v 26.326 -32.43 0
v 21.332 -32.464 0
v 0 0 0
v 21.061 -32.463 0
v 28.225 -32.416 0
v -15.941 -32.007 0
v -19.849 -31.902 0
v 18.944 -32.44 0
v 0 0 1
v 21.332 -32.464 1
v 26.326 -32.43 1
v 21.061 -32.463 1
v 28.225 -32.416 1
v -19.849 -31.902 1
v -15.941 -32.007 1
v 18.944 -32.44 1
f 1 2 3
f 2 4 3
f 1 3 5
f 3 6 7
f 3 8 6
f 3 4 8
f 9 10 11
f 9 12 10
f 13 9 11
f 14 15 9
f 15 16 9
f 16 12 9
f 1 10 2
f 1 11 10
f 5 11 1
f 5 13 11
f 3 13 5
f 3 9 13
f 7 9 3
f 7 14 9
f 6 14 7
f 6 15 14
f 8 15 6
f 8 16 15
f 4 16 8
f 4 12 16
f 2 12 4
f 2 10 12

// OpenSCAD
// Generated by SolidPython 1.1.3 on 2024-05-19 23:35:49


linear_extrude(height = 1) {
	polygon(points = [[0, 0], [-19.8494445312, -31.9016843750], [-19.7820644531, -31.9034984375], [-19.7146843750, -31.9053125000], [-19.6473042969, -31.9071265625], [-19.5799242187, -31.9089406250], [-19.5125441406, -31.9107546875], [-19.4451640625, -31.9125687500], [-19.3777839844, -31.9143828125], [-19.3104039062, -31.9161968750], [-19.2430238281, -31.9180109375], [-19.1756437500, -31.9198250000], [-19.1082636719, -31.9216390625], [-19.0408835937, -31.9234531250], [-18.9735035156, -31.9252671875], [-18.9061234375, -31.9270812500], [-18.8387433594, -31.9288953125], [-18.7713632813, -31.9307093750], [-18.7039832031, -31.9325234375], [-18.6366031250, -31.9343375000], [-18.5692230469, -31.9361515625], [-18.5018429688, -31.9379656250], [-18.4344628906, -31.9397796875], [-18.3670828125, -31.9415937500], [-18.2997027344, -31.9434078125], [-18.2323226562, -31.9452218750], [-18.1649425781, -31.9470359375], [-18.0975625000, -31.9488500000], [-18.0301824219, -31.9506640625], [-17.9628023437, -31.9524781250], [-17.8954222656, -31.9542921875], [-17.8280421875, -31.9561062500], [-17.7606621094, -31.9579203125], [-17.6932820312, -31.9597343750], [-17.6259019531, -31.9615484375], [-17.5585218750, -31.9633625000], [-17.4911417969, -31.9651765625], [-17.4237617187, -31.9669906250], [-17.3563816406, -31.9688046875], [-17.2890015625, -31.9706187500], [-17.2216214844, -31.9724328125], [-17.1542414062, -31.9742468750], [-17.0868613281, -31.9760609375], [-17.0194812500, -31.9778750000], [-16.9521011719, -31.9796890625], [-16.8847210937, -31.9815031250], [-16.8173410156, -31.9833171875], [-16.7499609375, -31.9851312500], [-16.6825808594, -31.9869453125], [-16.6152007812, -31.9887593750], [-16.5478207031, -31.9905734375], [-16.4804406250, -31.9923875000], [-16.4130605469, -31.9942015625], [-16.3456804688, -31.9960156250], [-16.2783003906, -31.9978296875], [-16.2109203125, -31.9996437500], [-16.1435402344, -32.0014578125], [-16.0761601563, -32.0032718750], [-16.0087800781, -32.0050859375], [-15.9414000000, -32.0069000000], [-15.8732650391, -32.0077462891], [-15.8051300781, -32.0085925781], [-15.7369951172, -32.0094388672], [-15.6688601562, -32.0102851563], [-15.6007251953, -32.0111314453], [-15.5325902344, -32.0119777344], [-15.4644552734, -32.0128240234], [-15.3963203125, -32.0136703125], [-15.3281853516, -32.0145166016], [-15.2600503906, -32.0153628906], [-15.1919154297, -32.0162091797], [-15.1237804687, -32.0170554688], [-15.0556455078, -32.0179017578], [-14.9875105469, -32.0187480469], [-14.9193755859, -32.0195943359], [-14.8512406250, -32.0204406250], [-14.7831056641, -32.0212869141], [-14.7149707031, -32.0221332031], [-14.6468357422, -32.0229794922], [-14.5787007812, -32.0238257813], [-14.5105658203, -32.0246720703], [-14.4424308594, -32.0255183594], [-14.3742958984, -32.0263646484], [-14.3061609375, -32.0272109375], [-14.2380259766, -32.0280572266], [-14.1698910156, -32.0289035156], [-14.1017560547, -32.0297498047], [-14.0336210937, -32.0305960938], [-13.9654861328, -32.0314423828], [-13.8973511719, -32.0322886719], [-13.8292162109, -32.0331349609], [-13.7610812500, -32.0339812500], [-13.6929462891, -32.0348275391], [-13.6248113281, -32.0356738281], [-13.5566763672, -32.0365201172], [-13.4885414063, -32.0373664063], [-13.4204064453, -32.0382126953], [-13.3522714844, -32.0390589844], [-13.2841365234, -32.0399052734], [-13.2160015625, -32.0407515625], [-13.1478666016, -32.0415978516], [-13.0797316406, -32.0424441406], [-13.0115966797, -32.0432904297], [-12.9434617188, -32.0441367188], [-12.8753267578, -32.0449830078], [-12.8071917969, -32.0458292969], [-12.7390568359, -32.0466755859], [-12.6709218750, -32.0475218750], [-12.6027869141, -32.0483681641], [-12.5346519531, -32.0492144531], [-12.4665169922, -32.0500607422], [-12.3983820312, -32.0509070313], [-12.3302470703, -32.0517533203], [-12.2621121094, -32.0525996094], [-12.1939771484, -32.0534458984], [-12.1258421875, -32.0542921875], [-12.0577072266, -32.0551384766], [-11.9895722656, -32.0559847656], [-11.9214373047, -32.0568310547], [-11.8533023437, -32.0576773438], [-11.7851673828, -32.0585236328], [-11.7170324219, -32.0593699219], [-11.6488974609, -32.0602162109], [-11.5807625000, -32.0610625000], [-11.5126275391, -32.0619087891], [-11.4444925781, -32.0627550781], [-11.3763576172, -32.0636013672], [-11.3082226562, -32.0644476563], [-11.2400876953, -32.0652939453], [-11.1719527344, -32.0661402344], [-11.1038177734, -32.0669865234], [-11.0356828125, -32.0678328125], [-10.9675478516, -32.0686791016], [-10.8994128906, -32.0695253906], [-10.8312779297, -32.0703716797], [-10.7631429687, -32.0712179688], [-10.6950080078, -32.0720642578], [-10.6268730469, -32.0729105469], [-10.5587380859, -32.0737568359], [-10.4906031250, -32.0746031250], [-10.4224681641, -32.0754494141], [-10.3543332031, -32.0762957031], [-10.2861982422, -32.0771419922], [-10.2180632813, -32.0779882813], [-10.1499283203, -32.0788345703], [-10.0817933594, -32.0796808594], [-10.0136583984, -32.0805271484], [-9.9455234375, -32.0813734375], [-9.8773884766, -32.0822197266], [-9.8092535156, -32.0830660156], [-9.7411185547, -32.0839123047], [-9.6729835938, -32.0847585938], [-9.6048486328, -32.0856048828], [-9.5367136719, -32.0864511719], [-9.4685787109, -32.0872974609], [-9.4004437500, -32.0881437500], [-9.3323087891, -32.0889900391], [-9.2641738281, -32.0898363281], [-9.1960388672, -32.0906826172], [-9.1279039062, -32.0915289063], [-9.0597689453, -32.0923751953], [-8.9916339844, -32.0932214844], [-8.9234990234, -32.0940677734], [-8.8553640625, -32.0949140625], [-8.7872291016, -32.0957603516], [-8.7190941406, -32.0966066406], [-8.6509591797, -32.0974529297], [-8.5828242187, -32.0982992188], [-8.5146892578, -32.0991455078], [-8.4465542969, -32.0999917969], [-8.3784193359, -32.1008380859], [-8.3102843750, -32.1016843750], [-8.2421494141, -32.1025306641], [-8.1740144531, -32.1033769531], [-8.1058794922, -32.1042232422], [-8.0377445312, -32.1050695313], [-7.9696095703, -32.1059158203], [-7.9014746094, -32.1067621094], [-7.8333396484, -32.1076083984], [-7.7652046875, -32.1084546875], [-7.6970697266, -32.1093009766], [-7.6289347656, -32.1101472656], [-7.5607998047, -32.1109935547], [-7.4926648437, -32.1118398438], [-7.4245298828, -32.1126861328], [-7.3563949219, -32.1135324219], [-7.2882599609, -32.1143787109], [-7.2201250000, -32.1152250000], [-7.1519900391, -32.1160712891], [-7.0838550781, -32.1169175781], [-7.0157201172, -32.1177638672], [-6.9475851562, -32.1186101562], [-6.8794501953, -32.1194564453], [-6.8113152344, -32.1203027344], [-6.7431802734, -32.1211490234], [-6.6750453125, -32.1219953125], [-6.6069103516, -32.1228416016], [-6.5387753906, -32.1236878906], [-6.4706404297, -32.1245341797], [-6.4025054688, -32.1253804688], [-6.3343705078, -32.1262267578], [-6.2662355469, -32.1270730469], [-6.1981005859, -32.1279193359], [-6.1299656250, -32.1287656250], [-6.0618306641, -32.1296119141], [-5.9936957031, -32.1304582031], [-5.9255607422, -32.1313044922], [-5.8574257812, -32.1321507813], [-5.7892908203, -32.1329970703], [-5.7211558594, -32.1338433594], [-5.6530208984, -32.1346896484], [-5.5848859375, -32.1355359375], [-5.5167509766, -32.1363822266], [-5.4486160156, -32.1372285156], [-5.3804810547, -32.1380748047], [-5.3123460937, -32.1389210937], [-5.2442111328, -32.1397673828], [-5.1760761719, -32.1406136719], [-5.1079412109, -32.1414599609], [-5.0398062500, -32.1423062500], [-4.9716712891, -32.1431525391], [-4.9035363281, -32.1439988281], [-4.8354013672, -32.1448451172], [-4.7672664063, -32.1456914063], [-4.6991314453, -32.1465376953], [-4.6309964844, -32.1473839844], [-4.5628615234, -32.1482302734], [-4.4947265625, -32.1490765625], [-4.4265916016, -32.1499228516], [-4.3584566406, -32.1507691406], [-4.2903216797, -32.1516154297], [-4.2221867188, -32.1524617188], [-4.1540517578, -32.1533080078], [-4.0859167969, -32.1541542969], [-4.0177818359, -32.1550005859], [-3.9496468750, -32.1558468750], [-3.8815119141, -32.1566931641], [-3.8133769531, -32.1575394531], [-3.7452419922, -32.1583857422], [-3.6771070312, -32.1592320312], [-3.6089720703, -32.1600783203], [-3.5408371094, -32.1609246094], [-3.4727021484, -32.1617708984], [-3.4045671875, -32.1626171875], [-3.3364322266, -32.1634634766], [-3.2682972656, -32.1643097656], [-3.2001623047, -32.1651560547], [-3.1320273437, -32.1660023438], [-3.0638923828, -32.1668486328], [-2.9957574219, -32.1676949219], [-2.9276224609, -32.1685412109], [-2.8594875000, -32.1693875000], [-2.7913525391, -32.1702337891], [-2.7232175781, -32.1710800781], [-2.6550826172, -32.1719263672], [-2.5869476562, -32.1727726563], [-2.5188126953, -32.1736189453], [-2.4506777344, -32.1744652344], [-2.3825427734, -32.1753115234], [-2.3144078125, -32.1761578125], [-2.2462728516, -32.1770041016], [-2.1781378906, -32.1778503906], [-2.1100029297, -32.1786966797], [-2.0418679688, -32.1795429687], [-1.9737330078, -32.1803892578], [-1.9055980469, -32.1812355469], [-1.8374630859, -32.1820818359], [-1.7693281250, -32.1829281250], [-1.7011931641, -32.1837744141], [-1.6330582031, -32.1846207031], [-1.5649232422, -32.1854669922], [-1.4967882812, -32.1863132813], [-1.4286533203, -32.1871595703], [-1.3605183594, -32.1880058594], [-1.2923833984, -32.1888521484], [-1.2242484375, -32.1896984375], [-1.1561134766, -32.1905447266], [-1.0879785156, -32.1913910156], [-1.0198435547, -32.1922373047], [-0.9517085937, -32.1930835938], [-0.8835736328, -32.1939298828], [-0.8154386719, -32.1947761719], [-0.7473037109, -32.1956224609], [-0.6791687500, -32.1964687500], [-0.6110337891, -32.1973150391], [-0.5428988281, -32.1981613281], [-0.4747638672, -32.1990076172], [-0.4066289062, -32.1998539062], [-0.3384939453, -32.2007001953], [-0.2703589844, -32.2015464844], [-0.2022240234, -32.2023927734], [-0.1340890625, -32.2032390625], [-0.0659541016, -32.2040853516], [0.0021808594, -32.2049316406], [0.0703158203, -32.2057779297], [0.1384507813, -32.2066242188], [0.2065857422, -32.2074705078], [0.2747207031, -32.2083167969], [0.3428556641, -32.2091630859], [0.4109906250, -32.2100093750], [0.4791255859, -32.2108556641], [0.5472605469, -32.2117019531], [0.6153955078, -32.2125482422], [0.6835304688, -32.2133945313], [0.7516654297, -32.2142408203], [0.8198003906, -32.2150871094], [0.8879353516, -32.2159333984], [0.9560703125, -32.2167796875], [1.0242052734, -32.2176259766], [1.0923402344, -32.2184722656], [1.1604751953, -32.2193185547], [1.2286101563, -32.2201648437], [1.2967451172, -32.2210111328], [1.3648800781, -32.2218574219], [1.4330150391, -32.2227037109], [1.5011500000, -32.2235500000], [1.5692849609, -32.2243962891], [1.6374199219, -32.2252425781], [1.7055548828, -32.2260888672], [1.7736898437, -32.2269351563], [1.8418248047, -32.2277814453], [1.9099597656, -32.2286277344], [1.9780947266, -32.2294740234], [2.0462296875, -32.2303203125], [2.1143646484, -32.2311666016], [2.1824996094, -32.2320128906], [2.2506345703, -32.2328591797], [2.3187695313, -32.2337054688], [2.3869044922, -32.2345517578], [2.4550394531, -32.2353980469], [2.5231744141, -32.2362443359], [2.5913093750, -32.2370906250], [2.6594443359, -32.2379369141], [2.7275792969, -32.2387832031], [2.7957142578, -32.2396294922], [2.8638492187, -32.2404757812], [2.9319841797, -32.2413220703], [3.0001191406, -32.2421683594], [3.0682541016, -32.2430146484], [3.1363890625, -32.2438609375], [3.2045240234, -32.2447072266], [3.2726589844, -32.2455535156], [3.3407939453, -32.2463998047], [3.4089289062, -32.2472460938], [3.4770638672, -32.2480923828], [3.5451988281, -32.2489386719], [3.6133337891, -32.2497849609], [3.6814687500, -32.2506312500], [3.7496037109, -32.2514775391], [3.8177386719, -32.2523238281], [3.8858736328, -32.2531701172], [3.9540085938, -32.2540164063], [4.0221435547, -32.2548626953], [4.0902785156, -32.2557089844], [4.1584134766, -32.2565552734], [4.2265484375, -32.2574015625], [4.2946833984, -32.2582478516], [4.3628183594, -32.2590941406], [4.4309533203, -32.2599404297], [4.4990882812, -32.2607867187], [4.5672232422, -32.2616330078], [4.6353582031, -32.2624792969], [4.7034931641, -32.2633255859], [4.7716281250, -32.2641718750], [4.8397630859, -32.2650181641], [4.9078980469, -32.2658644531], [4.9760330078, -32.2667107422], [5.0441679688, -32.2675570312], [5.1123029297, -32.2684033203], [5.1804378906, -32.2692496094], [5.2485728516, -32.2700958984], [5.3167078125, -32.2709421875], [5.3848427734, -32.2717884766], [5.4529777344, -32.2726347656], [5.5211126953, -32.2734810547], [5.5892476563, -32.2743273438], [5.6573826172, -32.2751736328], [5.7255175781, -32.2760199219], [5.7936525391, -32.2768662109], [5.8617875000, -32.2777125000], [5.9299224609, -32.2785587891], [5.9980574219, -32.2794050781], [6.0661923828, -32.2802513672], [6.1343273437, -32.2810976562], [6.2024623047, -32.2819439453], [6.2705972656, -32.2827902344], [6.3387322266, -32.2836365234], [6.4068671875, -32.2844828125], [6.4750021484, -32.2853291016], [6.5431371094, -32.2861753906], [6.6112720703, -32.2870216797], [6.6794070312, -32.2878679687], [6.7475419922, -32.2887142578], [6.8156769531, -32.2895605469], [6.8838119141, -32.2904068359], [6.9519468750, -32.2912531250], [7.0200818359, -32.2920994141], [7.0882167969, -32.2929457031], [7.1563517578, -32.2937919922], [7.2244867188, -32.2946382813], [7.2926216797, -32.2954845703], [7.3607566406, -32.2963308594], [7.4288916016, -32.2971771484], [7.4970265625, -32.2980234375], [7.5651615234, -32.2988697266], [7.6332964844, -32.2997160156], [7.7014314453, -32.3005623047], [7.7695664063, -32.3014085937], [7.8377013672, -32.3022548828], [7.9058363281, -32.3031011719], [7.9739712891, -32.3039474609], [8.0421062500, -32.3047937500], [8.1102412109, -32.3056400391], [8.1783761719, -32.3064863281], [8.2465111328, -32.3073326172], [8.3146460937, -32.3081789062], [8.3827810547, -32.3090251953], [8.4509160156, -32.3098714844], [8.5190509766, -32.3107177734], [8.5871859375, -32.3115640625], [8.6553208984, -32.3124103516], [8.7234558594, -32.3132566406], [8.7915908203, -32.3141029297], [8.8597257812, -32.3149492188], [8.9278607422, -32.3157955078], [8.9959957031, -32.3166417969], [9.0641306641, -32.3174880859], [9.1322656250, -32.3183343750], [9.2004005859, -32.3191806641], [9.2685355469, -32.3200269531], [9.3366705078, -32.3208732422], [9.4048054687, -32.3217195312], [9.4729404297, -32.3225658203], [9.5410753906, -32.3234121094], [9.6092103516, -32.3242583984], [9.6773453125, -32.3251046875], [9.7454802734, -32.3259509766], [9.8136152344, -32.3267972656], [9.8817501953, -32.3276435547], [9.9498851562, -32.3284898437], [10.0180201172, -32.3293361328], [10.0861550781, -32.3301824219], [10.1542900391, -32.3310287109], [10.2224250000, -32.3318750000], [10.2905599609, -32.3327212891], [10.3586949219, -32.3335675781], [10.4268298828, -32.3344138672], [10.4949648438, -32.3352601563], [10.5630998047, -32.3361064453], [10.6312347656, -32.3369527344], [10.6993697266, -32.3377990234], [10.7675046875, -32.3386453125], [10.8356396484, -32.3394916016], [10.9037746094, -32.3403378906], [10.9719095703, -32.3411841797], [11.0400445313, -32.3420304687], [11.1081794922, -32.3428767578], [11.1763144531, -32.3437230469], [11.2444494141, -32.3445693359], [11.3125843750, -32.3454156250], [11.3807193359, -32.3462619141], [11.4488542969, -32.3471082031], [11.5169892578, -32.3479544922], [11.5851242187, -32.3488007812], [11.6532591797, -32.3496470703], [11.7213941406, -32.3504933594], [11.7895291016, -32.3513396484], [11.8576640625, -32.3521859375], [11.9257990234, -32.3530322266], [11.9939339844, -32.3538785156], [12.0620689453, -32.3547248047], [12.1302039062, -32.3555710938], [12.1983388672, -32.3564173828], [12.2664738281, -32.3572636719], [12.3346087891, -32.3581099609], [12.4027437500, -32.3589562500], [12.4708787109, -32.3598025391], [12.5390136719, -32.3606488281], [12.6071486328, -32.3614951172], [12.6752835937, -32.3623414062], [12.7434185547, -32.3631876953], [12.8115535156, -32.3640339844], [12.8796884766, -32.3648802734], [12.9478234375, -32.3657265625], [13.0159583984, -32.3665728516], [13.0840933594, -32.3674191406], [13.1522283203, -32.3682654297], [13.2203632812, -32.3691117187], [13.2884982422, -32.3699580078], [13.3566332031, -32.3708042969], [13.4247681641, -32.3716505859], [13.4929031250, -32.3724968750], [13.5610380859, -32.3733431641], [13.6291730469, -32.3741894531], [13.6973080078, -32.3750357422], [13.7654429688, -32.3758820313], [13.8335779297, -32.3767283203], [13.9017128906, -32.3775746094], [13.9698478516, -32.3784208984], [14.0379828125, -32.3792671875], [14.1061177734, -32.3801134766], [14.1742527344, -32.3809597656], [14.2423876953, -32.3818060547], [14.3105226563, -32.3826523437], [14.3786576172, -32.3834986328], [14.4467925781, -32.3843449219], [14.5149275391, -32.3851912109], [14.5830625000, -32.3860375000], [14.6511974609, -32.3868837891], [14.7193324219, -32.3877300781], [14.7874673828, -32.3885763672], [14.8556023438, -32.3894226562], [14.9237373047, -32.3902689453], [14.9918722656, -32.3911152344], [15.0600072266, -32.3919615234], [15.1281421875, -32.3928078125], [15.1962771484, -32.3936541016], [15.2644121094, -32.3945003906], [15.3325470703, -32.3953466797], [15.4006820312, -32.3961929688], [15.4688169922, -32.3970392578], [15.5369519531, -32.3978855469], [15.6050869141, -32.3987318359], [15.6732218750, -32.3995781250], [15.7413568359, -32.4004244141], [15.8094917969, -32.4012707031], [15.8776267578, -32.4021169922], [15.9457617188, -32.4029632812], [16.0138966797, -32.4038095703], [16.0820316406, -32.4046558594], [16.1501666016, -32.4055021484], [16.2183015625, -32.4063484375], [16.2864365234, -32.4071947266], [16.3545714844, -32.4080410156], [16.4227064453, -32.4088873047], [16.4908414063, -32.4097335937], [16.5589763672, -32.4105798828], [16.6271113281, -32.4114261719], [16.6952462891, -32.4122724609], [16.7633812500, -32.4131187500], [16.8315162109, -32.4139650391], [16.8996511719, -32.4148113281], [16.9677861328, -32.4156576172], [17.0359210938, -32.4165039062], [17.1040560547, -32.4173501953], [17.1721910156, -32.4181964844], [17.2403259766, -32.4190427734], [17.3084609375, -32.4198890625], [17.3765958984, -32.4207353516], [17.4447308594, -32.4215816406], [17.5128658203, -32.4224279297], [17.5810007813, -32.4232742187], [17.6491357422, -32.4241205078], [17.7172707031, -32.4249667969], [17.7854056641, -32.4258130859], [17.8535406250, -32.4266593750], [17.9216755859, -32.4275056641], [17.9898105469, -32.4283519531], [18.0579455078, -32.4291982422], [18.1260804688, -32.4300445312], [18.1942154297, -32.4308908203], [18.2623503906, -32.4317371094], [18.3304853516, -32.4325833984], [18.3986203125, -32.4334296875], [18.4667552734, -32.4342759766], [18.5348902344, -32.4351222656], [18.6030251953, -32.4359685547], [18.6711601563, -32.4368148437], [18.7392951172, -32.4376611328], [18.8074300781, -32.4385074219], [18.8755650391, -32.4393537109], [18.9437000000, -32.4402000000], [19.0098562500, -32.4409062500], [19.0760125000, -32.4416125000], [19.1421687500, -32.4423187500], [19.2083250000, -32.4430250000], [19.2744812500, -32.4437312500], [19.3406375000, -32.4444375000], [19.4067937500, -32.4451437500], [19.4729500000, -32.4458500000], [19.5391062500, -32.4465562500], [19.6052625000, -32.4472625000], [19.6714187500, -32.4479687500], [19.7375750000, -32.4486750000], [19.8037312500, -32.4493812500], [19.8698875000, -32.4500875000], [19.9360437500, -32.4507937500], [20.0022000000, -32.4515000000], [20.0683562500, -32.4522062500], [20.1345125000, -32.4529125000], [20.2006687500, -32.4536187500], [20.2668250000, -32.4543250000], [20.3329812500, -32.4550312500], [20.3991375000, -32.4557375000], [20.4652937500, -32.4564437500], [20.5314500000, -32.4571500000], [20.5976062500, -32.4578562500], [20.6637625000, -32.4585625000], [20.7299187500, -32.4592687500], [20.7960750000, -32.4599750000], [20.8622312500, -32.4606812500], [20.9283875000, -32.4613875000], [20.9945437500, -32.4620937500], [21.0607000000, -32.4628000000], [21.1285000000, -32.4631750000], [21.1963000000, -32.4635500000], [21.2641000000, -32.4639250000], [21.3319000000, -32.4643000000], [21.4099265625, -32.4637671875], [21.4879531250, -32.4632343750], [21.5659796875, -32.4627015625], [21.6440062500, -32.4621687500], [21.7220328125, -32.4616359375], [21.8000593750, -32.4611031250], [21.8780859375, -32.4605703125], [21.9561125000, -32.4600375000], [22.0341390625, -32.4595046875], [22.1121656250, -32.4589718750], [22.1901921875, -32.4584390625], [22.2682187500, -32.4579062500], [22.3462453125, -32.4573734375], [22.4242718750, -32.4568406250], [22.5022984375, -32.4563078125], [22.5803250000, -32.4557750000], [22.6583515625, -32.4552421875], [22.7363781250, -32.4547093750], [22.8144046875, -32.4541765625], [22.8924312500, -32.4536437500], [22.9704578125, -32.4531109375], [23.0484843750, -32.4525781250], [23.1265109375, -32.4520453125], [23.2045375000, -32.4515125000], [23.2825640625, -32.4509796875], [23.3605906250, -32.4504468750], [23.4386171875, -32.4499140625], [23.5166437500, -32.4493812500], [23.5946703125, -32.4488484375], [23.6726968750, -32.4483156250], [23.7507234375, -32.4477828125], [23.8287500000, -32.4472500000], [23.9067765625, -32.4467171875], [23.9848031250, -32.4461843750], [24.0628296875, -32.4456515625], [24.1408562500, -32.4451187500], [24.2188828125, -32.4445859375], [24.2969093750, -32.4440531250], [24.3749359375, -32.4435203125], [24.4529625000, -32.4429875000], [24.5309890625, -32.4424546875], [24.6090156250, -32.4419218750], [24.6870421875, -32.4413890625], [24.7650687500, -32.4408562500], [24.8430953125, -32.4403234375], [24.9211218750, -32.4397906250], [24.9991484375, -32.4392578125], [25.0771750000, -32.4387250000], [25.1552015625, -32.4381921875], [25.2332281250, -32.4376593750], [25.3112546875, -32.4371265625], [25.3892812500, -32.4365937500], [25.4673078125, -32.4360609375], [25.5453343750, -32.4355281250], [25.6233609375, -32.4349953125], [25.7013875000, -32.4344625000], [25.7794140625, -32.4339296875], [25.8574406250, -32.4333968750], [25.9354671875, -32.4328640625], [26.0134937500, -32.4323312500], [26.0915203125, -32.4317984375], [26.1695468750, -32.4312656250], [26.2475734375, -32.4307328125], [26.3256000000, -32.4302000000], [26.4047285156, -32.4295925781], [26.4838570313, -32.4289851563], [26.5629855469, -32.4283777344], [26.6421140625, -32.4277703125], [26.7212425781, -32.4271628906], [26.8003710938, -32.4265554688], [26.8794996094, -32.4259480469], [26.9586281250, -32.4253406250], [27.0377566406, -32.4247332031], [27.1168851562, -32.4241257813], [27.1960136719, -32.4235183594], [27.2751421875, -32.4229109375], [27.3542707031, -32.4223035156], [27.4333992188, -32.4216960938], [27.5125277344, -32.4210886719], [27.5916562500, -32.4204812500], [27.6707847656, -32.4198738281], [27.7499132813, -32.4192664063], [27.8290417969, -32.4186589844], [27.9081703125, -32.4180515625], [27.9872988281, -32.4174441406], [28.0664273438, -32.4168367187], [28.1455558594, -32.4162292969], [28.2246843750, -32.4156218750]]);
}
/***********************************************
*********      SolidPython code:      **********
************************************************
 
import math
import time

from stl import mesh, Dimension

from tkinter import Tk     # from tkinter import Tk for Python 3.x
from tkinter.filedialog import askopenfilename
from mpl_toolkits.mplot3d import art3d
from matplotlib import pyplot as plt
import solid
import os
import ezdxf
import shapely.geometry as sg
import subprocess
from GUI import getSCADPath



def outputSTL(From, To, PATH=getSCADPath()):
    subprocess.Popen(PATH + " -o " + To + " " + From)
    while not os.path.exists(To):
        time.sleep(1)


def get_size(i):
    x_list = [int(a) for a in str(i)]
    return len(x_list)



class Model:
    def __init__(self, model, fileName, location, layer, thickness):
        self.location = location
        self.code = None
        self.fileName = fileName
        self.stl = fileName + ".stl"
        self.layer = layer
        self.thickness = thickness
        self.maxz = (layer+1)*thickness
        self.dxf = fileName + ".dxf"
        self.scad = fileName + ".scad"
        self.model = model
        self.center = None
        self.width = 10
        self.mesh = None
        self.useable_area = None


    def get_code(self):
        max_dim = 0.05
        max_array = 6

        num = int(self.fileName)
        nums = [int(a) for a in str(num)]
        nums.reverse()
        indices = nums
        length = len(nums)

        print(indices)
        t = 0
        i = 0
        cubes = []
        x = 0
        y = 0
        width = 0.01
        while x <= max_dim:
            while y <= max_dim:
                print(indices)
                if nums == []:
                    break
                if indices[0] != 0:
                    cubes.append(solid.translate([x, y, 0])(solid.cube(size=t / 1000 + 0.001)))
                    y += max_dim / (max_array - 1)
                    nums[0] = nums[0] - 1
                else:
                    indices.pop(0)
                    t += 1
                i += 1
            x += max_dim / (max_array - 1)
            y = 0

        outside = solid.translate([-width / 2, -width / 2])(solid.cube(max_dim + (length - 1) / 1000 + 0.001 + width))
        self.code = solid.difference()(outside, cubes)
        self.code = solid.projection(cut=True)(self.code)
        solid.scad_render_to_file(self.code, self.location + "/code.scad")
        outputSTL(From=self.location+"/code.scad", To=self.location+"code.dxf", PATH=getSCADPath())
        # os.system("toSTL.sh renders/code.scad renders/code.dxf")
        return self.location+"/code.dxf"

    def download(self, type):
        if type =="stl":
            print("generating:" + self.location+"/"+ self.fileName+".stl")
            outputSTL(From=self.location+"/"+self.fileName+".scad", To=self.location+"/"+self.fileName+".stl")
            # os.system("toSTL.sh renders/"+ self.fileName+".scad renders/"+ self.fileName+".stl")
        elif type == "dxf":
            outputSTL(From=self.location+"/"+self.fileName+".scad", To=self.location+"/"+self.fileName+".dxf")
            # os.system("toSTL.sh renders/"+ self.fileName+".scad renders/"+ self.fileName+".dxf")

    def render(self):
        solid.scad_render_to_file(self.model, self.location+"/"+ self.fileName+'.scad')
        while not os.path.exists(self.location+"/"+self.fileName+".scad"):
            time.sleep(1)

    def get_points(self):
        doc = ezdxf.readfile(filename=self.location+"/"+ self.fileName+".dxf")
        msp = doc.modelspace()
        i=0
        lists = []
        def helper(e):
            start = [e.dxf.start[0], e.dxf.start[1]]
            end = [e.dxf.end[0], e.dxf.end[1]]
            return [start, end]

        for e in msp.query("LINE"):
            line = helper(e)
            if not lists:
                lists.append([line])
            else:
                if lists[i][len(lists)-1][1] != line[0]:
                    lists.append([line])
                    i+=1
                else:
                    lists[i].append(line)

    def get_points2(self, FILE):
        doc = ezdxf.readfile(filename=FILE)
        msp = doc.modelspace()
        i = 0
        lists = []

        def helper(e):
            start = [e.dxf.start[0], e.dxf.start[1]]
            end = [e.dxf.end[0], e.dxf.end[1]]
            return (start, end)

        for e in msp.query("LINE"):
            line = helper(e)
            if lists==[]:
                lists.append([line])
            else:
                if lists[i][len(lists[i]) - 1][1] != line[0]:
                    lists.append([line])
                    i += 1
                else:
                    lists[i].append(line)
        return lists

    def add_code(self):
        dxf = solid.projection(cut=False)(self.model)
        offset = solid.offset(r=-0.1)(dxf)
        solid.scad_render_to_file(offset, self.location+'/offset.scad')
        os.system("toSTL.sh renders/offset.scad renders/offset.dxf")
        lines = self.get_points2("renders/offset.dxf")
        x = lines[0][0][0][0]
        y = lines[0][0][0][1]
        print(x)
        print(y)
        code = solid.translate([x,y,0])(self.code)
        code = solid.linear_extrude(height=999)(code)
        save = self.model
        self.model = solid.projection()(solid.difference()(self.model, code))
        self.render()
        self.download("dxf")
        self.model = save

    def add_label(self, pos):
        # num = 12
        # minx, maxx, miny, maxy, minz, maxz = self.find_minmax()
        maxz = self.maxz
        # label = solid.linear_extrude(height=(maxz-minz)/3)(solid.text(str(self.fileName), size=0.5, halign="center"))
        # i=minx
        # print("x-len: " + str(maxx-minx))
        # print(i)
        # inc = (maxx-minx)/num
        # while minx <= i <= maxx:
        #     label = solid.union()(solid.translate([i, 0, maxz - 0.2])(solid.linear_extrude(height=(maxz-minz)/3)(solid.text(str(self.fileName), size=0.25, halign="center"))), label)
        #     i += inc
        #
        # l = label
        #
        # i =miny
        # while miny<= i <= maxy:
        #     print("y inc")
        #     l = solid.union()(solid.translate([0, i, 0])(label), l)
        #     i += 0.5
        for i in str(self.fileName):
            cur = pos[0]
            label = solid.translate([pos[0][0], pos[0][1], self.maxz-0.2])(solid.linear_extrude(height=(self.thickness)/3)(solid.text(str(i), size=0.5, halign="center", valign="center")))
            self.model = solid.difference()(self.model, label)
            pos.append(pos.pop(0))
            while abs(cur[0]-pos[0][0])<0.5 and abs(cur[1]-pos[0][1])<0.5:
                pos.append(pos.pop(0))



    def Center(self):

        volume, cog, inertia = self.mesh.get_mass_properties()
        print("Volume                                  = {0}".format(volume))
        print("Position of the center of gravity (COG) = {0}".format(cog))
        m_centered = solid.translate([-cog[0], -cog[1], 0])(
            self.model
        )
        return m_centered

    def find_minmax(self):
        minx = maxx = miny = maxy = minz = maxz = None
        for p in self.mesh.points:
            # p contains (x, y, z)
            if minx is None:
                minx = p[Dimension.X]
                maxx = p[Dimension.X]
                miny = p[Dimension.Y]
                maxy = p[Dimension.Y]
                minz = p[Dimension.Z]
                maxz = p[Dimension.Z]
            else:
                maxx = max(p[Dimension.X], maxx)
                minx = min(p[Dimension.X], minx)
                maxy = max(p[Dimension.Y], maxy)
                miny = min(p[Dimension.Y], miny)
                maxz = max(p[Dimension.Z], maxz)
                minz = min(p[Dimension.Z], minz)
        lenx = maxx - minx
        leny = maxy - miny
        lenz = maxz - minz
        return minx, maxx, miny, maxy, minz, maxz

    # def generate_Mesh(self):
    #     self.mesh = mesh.Mesh.from_file(self.location + "/" + str(int(self.fileName)//8)+ "b.stl")

    def get_top(self):
        top = solid.projection(cut=True)(solid.translate([0,0,-1*self.thickness*(self.layer+1)])(self.model))
        useable_area = solid.offset(r=-0.45)(top)
        self.useable_area = useable_area
        solid.scad_render_to_file(self.useable_area, self.location+'/' + 'toptemp.scad')
        outputSTL(From=self.location+'/' + 'toptemp.scad', To=self.location+"/top"+ self.dxf)

        # os.system("toSTL.sh out/toptemp.scad renders/" + self.fileName + ".dxf")
        dxf = DXF(self.location+"/top"+ self.dxf)
        min_p=dxf.points[0][0]
        points_ordered = dxf.points
        i=0
        while i <= len(dxf.points)+1:
            while math.sqrt((dxf.points[0][0]-dxf.points[1][0])**2+(dxf.points[0][1]-dxf.points[1][1])**2) > 0.1:
                dxf.points.insert(1, [(dxf.points[0][0]+dxf.points[1][0])/2, (dxf.points[0][1]+dxf.points[1][1])/2])
                i = i-1
            dxf.points.append(dxf.points.pop(0))
            i+=1
        for i in range(len(dxf.points)):
            dxf.points.append(dxf.points.pop(0))
            if dxf.points[0][0] < min_p:
                min_p = dxf.points[0][0]
                points_ordered = dxf.points.copy()
        dxf.points = points_ordered.copy()

        print(dxf.points)
        self.add_label(dxf.points)

class DXF:
    def __init__(self, file):
        self.file = file
        self.Lines = []
        self.points = []
        doc = ezdxf.readfile(self.file)
        msp = doc.modelspace()
        for e in msp:
            if e.dxftype() == "LINE":
                self.Lines.append(e)
                self.points.append([e.dxf.start[0], e.dxf.start[1]])
        # self.points.append([self.Lines[-1].dxf.end[0], self.Lines[-1].dxf.end[1]])
        self.area = None
        self.center = None
        self.polygon = sg.Polygon(self.points)

    def get_area(self):
        self.area = self.polygon.area
        return self.area

    def get_center(self):
        x_sum = 0
        y_sum =0
        for i in self.points:
            x_sum += i[0]
            y_sum += i[1]
        x_c = x_sum/len(self.points)
        y_c = y_sum/len(self.points)
        return (x_c, y_c)

    def split(self, maxdim):
        splits = []
        length = 0
        pieces = [[]]
        prev = self.points[0]
        for j in self.points:
            length = length + math.sqrt((prev[0]-j[0])**2+(prev[1]-j[1])**2)
            if length >= maxdim:
                pieces[-1].append(j)
                pieces.append([])
                length = 0
            pieces[-1].append(j)
            prev = j
        for j in pieces:
            j.insert(0, [0,0])
            piece = solid.linear_extrude(height=1)(solid.polygon(j))
            splits.append(piece)
        return splits
    def refine_points(self):
        i=0
        while i <= len(self.points)+1:
            while math.sqrt((self.points[0][0]-self.points[1][0])**2+(self.points[0][1]-self.points[1][1])**2) > 0.1:
                self.points.insert(1, [(self.points[0][0]+self.points[1][0])/2, (self.points[0][1]+self.points[1][1])/2])
                i = i-1
            self.points.append(self.points.pop(0))
            i+=1


if __name__== "__main__":
    test = DXF("C:/Users/Daniel/Documents/repos/Shell_Maker/output/0top_slice.dxf")
    test.refine_points()
    k = test.split(48)
    for i in range(len(k)):
        solid.scad_render_to_file(k[i], str(i) + ".scad")


 
 
************************************************/
